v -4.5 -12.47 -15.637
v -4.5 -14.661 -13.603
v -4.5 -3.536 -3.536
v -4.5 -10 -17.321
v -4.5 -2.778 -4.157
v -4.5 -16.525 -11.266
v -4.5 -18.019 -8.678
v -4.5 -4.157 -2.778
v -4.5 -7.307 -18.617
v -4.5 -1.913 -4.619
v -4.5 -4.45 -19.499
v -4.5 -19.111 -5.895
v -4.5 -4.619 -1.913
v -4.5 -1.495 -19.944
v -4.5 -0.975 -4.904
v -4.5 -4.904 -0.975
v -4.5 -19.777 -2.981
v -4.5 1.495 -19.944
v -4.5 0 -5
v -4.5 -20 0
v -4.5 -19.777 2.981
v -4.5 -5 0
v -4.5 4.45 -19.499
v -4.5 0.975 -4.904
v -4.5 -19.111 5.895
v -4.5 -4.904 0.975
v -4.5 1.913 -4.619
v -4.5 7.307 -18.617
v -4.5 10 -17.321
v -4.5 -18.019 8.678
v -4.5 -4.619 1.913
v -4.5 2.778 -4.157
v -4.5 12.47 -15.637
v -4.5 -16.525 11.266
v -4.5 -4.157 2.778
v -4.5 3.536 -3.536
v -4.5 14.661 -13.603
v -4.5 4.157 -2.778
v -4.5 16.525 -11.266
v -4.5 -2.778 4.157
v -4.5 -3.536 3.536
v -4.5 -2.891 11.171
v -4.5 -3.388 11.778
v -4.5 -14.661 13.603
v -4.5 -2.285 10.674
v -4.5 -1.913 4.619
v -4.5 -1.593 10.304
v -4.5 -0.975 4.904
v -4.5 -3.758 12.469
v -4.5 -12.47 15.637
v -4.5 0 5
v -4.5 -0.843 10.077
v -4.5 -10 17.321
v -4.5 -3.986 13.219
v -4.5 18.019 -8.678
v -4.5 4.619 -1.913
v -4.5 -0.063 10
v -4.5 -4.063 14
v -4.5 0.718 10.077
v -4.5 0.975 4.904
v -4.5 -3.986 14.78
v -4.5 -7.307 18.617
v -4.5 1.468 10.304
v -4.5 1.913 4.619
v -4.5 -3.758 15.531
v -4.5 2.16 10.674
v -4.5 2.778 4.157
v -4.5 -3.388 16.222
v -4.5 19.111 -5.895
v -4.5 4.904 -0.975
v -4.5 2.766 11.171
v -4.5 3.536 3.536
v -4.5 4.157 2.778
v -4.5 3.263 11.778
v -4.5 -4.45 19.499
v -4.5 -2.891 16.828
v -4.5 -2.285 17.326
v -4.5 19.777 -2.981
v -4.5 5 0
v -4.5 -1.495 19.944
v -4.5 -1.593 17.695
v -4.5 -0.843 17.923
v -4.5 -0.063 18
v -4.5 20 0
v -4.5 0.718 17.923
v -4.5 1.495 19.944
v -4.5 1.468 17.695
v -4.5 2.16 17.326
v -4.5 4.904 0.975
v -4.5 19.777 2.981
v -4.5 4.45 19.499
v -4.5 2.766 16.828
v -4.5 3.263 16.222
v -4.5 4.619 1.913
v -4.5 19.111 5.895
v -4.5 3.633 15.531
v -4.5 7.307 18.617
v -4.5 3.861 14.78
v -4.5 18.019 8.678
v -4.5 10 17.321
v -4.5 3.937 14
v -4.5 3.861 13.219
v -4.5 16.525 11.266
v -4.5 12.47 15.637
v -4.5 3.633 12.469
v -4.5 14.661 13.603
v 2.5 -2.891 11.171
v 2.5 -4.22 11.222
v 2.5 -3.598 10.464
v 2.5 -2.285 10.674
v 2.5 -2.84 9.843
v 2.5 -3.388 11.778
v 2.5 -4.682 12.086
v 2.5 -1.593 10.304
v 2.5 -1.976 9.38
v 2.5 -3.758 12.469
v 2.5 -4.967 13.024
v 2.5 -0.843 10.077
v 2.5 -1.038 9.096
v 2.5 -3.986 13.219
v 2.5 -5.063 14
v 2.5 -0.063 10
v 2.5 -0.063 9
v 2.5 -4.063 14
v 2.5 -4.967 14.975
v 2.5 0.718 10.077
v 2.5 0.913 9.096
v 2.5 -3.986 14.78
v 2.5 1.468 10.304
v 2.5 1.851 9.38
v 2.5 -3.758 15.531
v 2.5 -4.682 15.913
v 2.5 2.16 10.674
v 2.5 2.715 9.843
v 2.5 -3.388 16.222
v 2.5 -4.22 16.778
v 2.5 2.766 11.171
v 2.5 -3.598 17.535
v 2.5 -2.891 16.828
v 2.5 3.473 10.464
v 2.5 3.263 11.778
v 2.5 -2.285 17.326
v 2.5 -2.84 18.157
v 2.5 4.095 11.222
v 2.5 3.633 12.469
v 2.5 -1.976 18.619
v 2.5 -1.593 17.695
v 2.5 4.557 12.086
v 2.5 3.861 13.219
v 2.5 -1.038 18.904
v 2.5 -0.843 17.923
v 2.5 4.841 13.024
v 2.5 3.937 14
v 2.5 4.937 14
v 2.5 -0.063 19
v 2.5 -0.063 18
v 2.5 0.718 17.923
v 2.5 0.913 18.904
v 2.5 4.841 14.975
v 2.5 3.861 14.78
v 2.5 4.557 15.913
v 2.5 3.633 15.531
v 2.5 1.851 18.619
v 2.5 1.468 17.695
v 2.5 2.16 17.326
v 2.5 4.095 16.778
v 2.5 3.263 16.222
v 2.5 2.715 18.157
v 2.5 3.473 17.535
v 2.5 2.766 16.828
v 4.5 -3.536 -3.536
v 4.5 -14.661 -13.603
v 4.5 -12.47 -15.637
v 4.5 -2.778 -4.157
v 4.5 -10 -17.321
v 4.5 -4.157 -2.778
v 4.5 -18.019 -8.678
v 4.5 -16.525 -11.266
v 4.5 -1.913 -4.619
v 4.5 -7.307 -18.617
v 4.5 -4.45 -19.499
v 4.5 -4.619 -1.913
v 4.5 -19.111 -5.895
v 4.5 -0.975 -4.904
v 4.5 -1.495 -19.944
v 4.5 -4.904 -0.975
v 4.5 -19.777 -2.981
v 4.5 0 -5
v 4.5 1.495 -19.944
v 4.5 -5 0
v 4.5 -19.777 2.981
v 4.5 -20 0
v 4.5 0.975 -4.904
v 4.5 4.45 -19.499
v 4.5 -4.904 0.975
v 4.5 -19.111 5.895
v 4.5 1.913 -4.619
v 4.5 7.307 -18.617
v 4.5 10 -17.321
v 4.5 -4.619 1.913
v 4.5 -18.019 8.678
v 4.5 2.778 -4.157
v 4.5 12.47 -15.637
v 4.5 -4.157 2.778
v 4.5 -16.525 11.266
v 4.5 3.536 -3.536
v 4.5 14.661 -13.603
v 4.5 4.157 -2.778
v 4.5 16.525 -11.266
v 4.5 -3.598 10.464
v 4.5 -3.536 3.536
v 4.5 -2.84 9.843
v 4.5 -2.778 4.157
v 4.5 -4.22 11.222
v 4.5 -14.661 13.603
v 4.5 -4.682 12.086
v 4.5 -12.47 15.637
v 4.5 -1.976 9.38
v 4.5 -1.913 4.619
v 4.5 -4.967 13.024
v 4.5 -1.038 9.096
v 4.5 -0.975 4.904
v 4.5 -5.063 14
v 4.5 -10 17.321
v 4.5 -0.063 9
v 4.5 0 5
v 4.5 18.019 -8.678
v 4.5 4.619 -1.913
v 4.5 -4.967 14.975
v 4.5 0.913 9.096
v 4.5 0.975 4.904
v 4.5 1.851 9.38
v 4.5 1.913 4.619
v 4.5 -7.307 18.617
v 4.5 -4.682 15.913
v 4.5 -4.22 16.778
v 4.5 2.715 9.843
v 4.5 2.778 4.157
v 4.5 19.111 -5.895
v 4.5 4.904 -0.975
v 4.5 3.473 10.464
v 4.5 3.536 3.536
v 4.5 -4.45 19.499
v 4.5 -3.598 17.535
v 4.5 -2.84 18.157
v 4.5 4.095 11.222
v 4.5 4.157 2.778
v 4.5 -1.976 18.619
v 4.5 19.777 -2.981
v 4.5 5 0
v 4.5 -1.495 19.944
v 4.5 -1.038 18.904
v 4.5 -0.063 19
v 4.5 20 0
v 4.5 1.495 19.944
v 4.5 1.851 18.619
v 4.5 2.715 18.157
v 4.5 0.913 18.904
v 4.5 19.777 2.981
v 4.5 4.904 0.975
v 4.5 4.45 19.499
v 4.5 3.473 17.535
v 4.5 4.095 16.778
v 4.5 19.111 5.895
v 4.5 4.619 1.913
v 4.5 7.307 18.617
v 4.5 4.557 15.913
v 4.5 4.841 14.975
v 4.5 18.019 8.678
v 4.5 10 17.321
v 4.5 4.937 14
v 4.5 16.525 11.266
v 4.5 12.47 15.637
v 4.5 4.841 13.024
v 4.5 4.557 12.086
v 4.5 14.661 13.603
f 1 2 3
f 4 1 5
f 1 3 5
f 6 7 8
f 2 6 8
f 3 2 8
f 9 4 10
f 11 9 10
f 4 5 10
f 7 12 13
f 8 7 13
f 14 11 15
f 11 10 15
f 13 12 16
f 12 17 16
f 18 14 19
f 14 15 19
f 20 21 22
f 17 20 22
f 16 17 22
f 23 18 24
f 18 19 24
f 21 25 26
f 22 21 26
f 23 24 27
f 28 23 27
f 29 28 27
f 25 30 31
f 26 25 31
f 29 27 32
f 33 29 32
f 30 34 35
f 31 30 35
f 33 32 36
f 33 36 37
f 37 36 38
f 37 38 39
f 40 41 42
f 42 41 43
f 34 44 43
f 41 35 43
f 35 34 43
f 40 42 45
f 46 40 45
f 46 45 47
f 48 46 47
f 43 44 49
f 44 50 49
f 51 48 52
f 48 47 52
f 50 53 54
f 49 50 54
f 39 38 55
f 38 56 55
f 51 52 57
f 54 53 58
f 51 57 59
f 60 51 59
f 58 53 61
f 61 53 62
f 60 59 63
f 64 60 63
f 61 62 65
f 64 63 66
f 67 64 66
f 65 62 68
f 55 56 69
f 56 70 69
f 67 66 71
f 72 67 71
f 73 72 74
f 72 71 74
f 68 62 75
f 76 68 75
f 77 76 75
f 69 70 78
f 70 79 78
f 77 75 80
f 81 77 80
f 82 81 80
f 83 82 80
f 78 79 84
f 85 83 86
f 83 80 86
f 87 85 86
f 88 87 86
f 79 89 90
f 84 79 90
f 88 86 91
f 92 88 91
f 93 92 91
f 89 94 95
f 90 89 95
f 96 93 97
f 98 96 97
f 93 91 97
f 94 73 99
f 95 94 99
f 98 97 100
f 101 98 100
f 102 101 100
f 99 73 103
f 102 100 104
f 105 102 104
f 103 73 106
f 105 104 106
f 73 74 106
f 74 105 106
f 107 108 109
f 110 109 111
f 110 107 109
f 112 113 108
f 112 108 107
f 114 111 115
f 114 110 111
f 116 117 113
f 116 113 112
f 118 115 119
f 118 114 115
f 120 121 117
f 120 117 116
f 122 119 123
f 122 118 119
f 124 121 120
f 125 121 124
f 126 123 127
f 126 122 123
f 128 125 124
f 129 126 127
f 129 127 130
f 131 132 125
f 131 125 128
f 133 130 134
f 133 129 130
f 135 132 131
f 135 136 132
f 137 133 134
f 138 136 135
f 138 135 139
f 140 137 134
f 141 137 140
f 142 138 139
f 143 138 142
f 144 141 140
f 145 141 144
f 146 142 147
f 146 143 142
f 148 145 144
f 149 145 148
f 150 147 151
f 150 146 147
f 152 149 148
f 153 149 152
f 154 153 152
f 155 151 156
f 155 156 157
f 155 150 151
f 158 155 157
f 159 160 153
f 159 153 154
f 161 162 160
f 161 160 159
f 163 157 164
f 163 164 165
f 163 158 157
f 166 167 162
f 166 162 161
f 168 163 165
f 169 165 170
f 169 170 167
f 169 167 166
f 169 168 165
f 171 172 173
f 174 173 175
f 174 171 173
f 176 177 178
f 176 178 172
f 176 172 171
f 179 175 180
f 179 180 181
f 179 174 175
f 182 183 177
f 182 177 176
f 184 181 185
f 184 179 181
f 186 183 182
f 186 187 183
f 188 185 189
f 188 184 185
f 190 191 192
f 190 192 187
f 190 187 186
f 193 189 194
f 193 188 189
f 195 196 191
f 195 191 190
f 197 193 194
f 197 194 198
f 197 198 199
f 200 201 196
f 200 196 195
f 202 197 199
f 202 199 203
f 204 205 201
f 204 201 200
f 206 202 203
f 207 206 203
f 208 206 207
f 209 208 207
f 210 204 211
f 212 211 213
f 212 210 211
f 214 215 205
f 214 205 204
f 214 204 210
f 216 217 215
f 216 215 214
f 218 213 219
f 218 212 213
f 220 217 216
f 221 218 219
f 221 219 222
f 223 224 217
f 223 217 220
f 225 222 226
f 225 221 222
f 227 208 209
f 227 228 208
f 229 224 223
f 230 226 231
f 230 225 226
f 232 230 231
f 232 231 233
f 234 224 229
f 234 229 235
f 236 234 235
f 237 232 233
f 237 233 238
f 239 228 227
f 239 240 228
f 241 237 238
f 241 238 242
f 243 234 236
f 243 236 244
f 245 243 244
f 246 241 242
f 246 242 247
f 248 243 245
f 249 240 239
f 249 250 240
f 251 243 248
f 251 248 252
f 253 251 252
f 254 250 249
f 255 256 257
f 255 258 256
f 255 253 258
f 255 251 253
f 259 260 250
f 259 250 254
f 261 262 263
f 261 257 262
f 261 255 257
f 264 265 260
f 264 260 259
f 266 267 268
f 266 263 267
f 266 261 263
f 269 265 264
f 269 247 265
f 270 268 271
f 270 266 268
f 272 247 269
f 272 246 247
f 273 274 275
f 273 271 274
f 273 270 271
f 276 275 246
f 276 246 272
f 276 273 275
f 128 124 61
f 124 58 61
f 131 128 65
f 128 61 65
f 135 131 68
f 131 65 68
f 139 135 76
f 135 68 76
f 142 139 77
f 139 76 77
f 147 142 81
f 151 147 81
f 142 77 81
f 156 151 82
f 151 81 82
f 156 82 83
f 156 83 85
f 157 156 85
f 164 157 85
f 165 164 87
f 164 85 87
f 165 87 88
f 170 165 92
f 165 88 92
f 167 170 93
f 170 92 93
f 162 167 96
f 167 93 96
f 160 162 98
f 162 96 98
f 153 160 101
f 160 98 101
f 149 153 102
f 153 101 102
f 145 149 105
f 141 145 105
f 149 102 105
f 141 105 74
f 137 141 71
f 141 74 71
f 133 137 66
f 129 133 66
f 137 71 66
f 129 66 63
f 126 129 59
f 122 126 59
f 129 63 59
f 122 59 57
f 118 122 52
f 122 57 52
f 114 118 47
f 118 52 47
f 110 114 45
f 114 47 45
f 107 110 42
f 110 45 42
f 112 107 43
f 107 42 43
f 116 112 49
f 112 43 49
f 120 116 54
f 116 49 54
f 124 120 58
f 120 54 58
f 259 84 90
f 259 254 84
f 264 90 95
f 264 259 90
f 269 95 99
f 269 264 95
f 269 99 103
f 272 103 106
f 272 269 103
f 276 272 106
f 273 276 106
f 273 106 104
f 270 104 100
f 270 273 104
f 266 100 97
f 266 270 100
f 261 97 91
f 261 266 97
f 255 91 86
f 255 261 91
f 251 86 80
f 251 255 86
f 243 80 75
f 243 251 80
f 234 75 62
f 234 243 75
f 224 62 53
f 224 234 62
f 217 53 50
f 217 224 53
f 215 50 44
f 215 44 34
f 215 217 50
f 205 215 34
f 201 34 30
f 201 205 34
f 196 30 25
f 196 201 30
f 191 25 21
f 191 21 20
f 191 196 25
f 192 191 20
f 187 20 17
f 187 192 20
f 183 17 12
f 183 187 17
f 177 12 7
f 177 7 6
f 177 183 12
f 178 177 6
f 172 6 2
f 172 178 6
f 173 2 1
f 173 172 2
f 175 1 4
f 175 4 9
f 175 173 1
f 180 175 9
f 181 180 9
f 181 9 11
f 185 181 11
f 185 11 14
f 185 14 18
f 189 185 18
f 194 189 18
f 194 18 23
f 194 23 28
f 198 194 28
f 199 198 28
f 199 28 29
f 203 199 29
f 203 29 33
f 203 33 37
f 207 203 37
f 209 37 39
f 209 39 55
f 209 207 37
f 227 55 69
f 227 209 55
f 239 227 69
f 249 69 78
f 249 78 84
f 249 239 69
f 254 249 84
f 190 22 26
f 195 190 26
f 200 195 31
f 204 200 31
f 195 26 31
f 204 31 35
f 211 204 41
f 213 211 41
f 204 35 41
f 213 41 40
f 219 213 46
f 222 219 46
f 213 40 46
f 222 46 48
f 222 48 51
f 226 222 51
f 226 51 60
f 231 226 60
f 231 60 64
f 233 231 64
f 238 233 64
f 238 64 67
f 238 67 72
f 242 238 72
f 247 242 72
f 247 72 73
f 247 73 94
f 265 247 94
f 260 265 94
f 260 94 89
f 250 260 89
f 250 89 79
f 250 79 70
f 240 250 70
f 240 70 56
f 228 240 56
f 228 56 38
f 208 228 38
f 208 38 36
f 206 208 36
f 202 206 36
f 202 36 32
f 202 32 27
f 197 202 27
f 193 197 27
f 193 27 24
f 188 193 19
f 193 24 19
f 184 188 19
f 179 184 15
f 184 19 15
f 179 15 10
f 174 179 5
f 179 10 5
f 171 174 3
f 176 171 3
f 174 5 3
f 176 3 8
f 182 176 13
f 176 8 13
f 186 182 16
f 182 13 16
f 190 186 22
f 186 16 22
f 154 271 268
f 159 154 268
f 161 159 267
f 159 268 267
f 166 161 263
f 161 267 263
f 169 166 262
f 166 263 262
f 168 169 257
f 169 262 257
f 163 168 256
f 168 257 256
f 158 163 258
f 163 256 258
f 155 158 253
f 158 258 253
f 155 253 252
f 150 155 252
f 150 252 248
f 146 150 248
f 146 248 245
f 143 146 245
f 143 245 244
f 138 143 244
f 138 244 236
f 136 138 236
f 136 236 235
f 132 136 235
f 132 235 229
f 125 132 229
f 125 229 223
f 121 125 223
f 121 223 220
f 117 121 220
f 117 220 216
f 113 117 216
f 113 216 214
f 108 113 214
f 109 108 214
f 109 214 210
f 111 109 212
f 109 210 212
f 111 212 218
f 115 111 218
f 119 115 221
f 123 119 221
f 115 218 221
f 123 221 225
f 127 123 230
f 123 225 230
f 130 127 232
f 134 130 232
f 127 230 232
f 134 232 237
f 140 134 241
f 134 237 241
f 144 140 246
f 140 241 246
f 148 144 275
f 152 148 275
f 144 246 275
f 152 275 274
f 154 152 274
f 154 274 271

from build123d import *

# Parameters (mm, degrees)
F0_R           = 20
F1_DEPTH       = 4.5
F3_D           = 10
F4_D           = 8
F4_CBORE_D     = 10
F4_CBORE_DEPTH = 2


with BuildPart() as f1:
    # F0 (on Right) → F1 (new body, symmetric)
    with BuildSketch(Plane.YZ):
        Circle(F0_R)
    extrude(amount=F1_DEPTH, both=True)

    # F3 (through all)
    with Locations(Plane.YZ.offset(4.5)):
        with Locations((0, 0)):
            Hole(F3_D / 2)

    # F4 (through all)
    with Locations(Plane.YZ.offset(4.5)):
        with Locations((-0.062594, 13.99986)):
            CounterBoreHole(F4_D / 2, F4_CBORE_D / 2, F4_CBORE_DEPTH)


solid = f1.part
